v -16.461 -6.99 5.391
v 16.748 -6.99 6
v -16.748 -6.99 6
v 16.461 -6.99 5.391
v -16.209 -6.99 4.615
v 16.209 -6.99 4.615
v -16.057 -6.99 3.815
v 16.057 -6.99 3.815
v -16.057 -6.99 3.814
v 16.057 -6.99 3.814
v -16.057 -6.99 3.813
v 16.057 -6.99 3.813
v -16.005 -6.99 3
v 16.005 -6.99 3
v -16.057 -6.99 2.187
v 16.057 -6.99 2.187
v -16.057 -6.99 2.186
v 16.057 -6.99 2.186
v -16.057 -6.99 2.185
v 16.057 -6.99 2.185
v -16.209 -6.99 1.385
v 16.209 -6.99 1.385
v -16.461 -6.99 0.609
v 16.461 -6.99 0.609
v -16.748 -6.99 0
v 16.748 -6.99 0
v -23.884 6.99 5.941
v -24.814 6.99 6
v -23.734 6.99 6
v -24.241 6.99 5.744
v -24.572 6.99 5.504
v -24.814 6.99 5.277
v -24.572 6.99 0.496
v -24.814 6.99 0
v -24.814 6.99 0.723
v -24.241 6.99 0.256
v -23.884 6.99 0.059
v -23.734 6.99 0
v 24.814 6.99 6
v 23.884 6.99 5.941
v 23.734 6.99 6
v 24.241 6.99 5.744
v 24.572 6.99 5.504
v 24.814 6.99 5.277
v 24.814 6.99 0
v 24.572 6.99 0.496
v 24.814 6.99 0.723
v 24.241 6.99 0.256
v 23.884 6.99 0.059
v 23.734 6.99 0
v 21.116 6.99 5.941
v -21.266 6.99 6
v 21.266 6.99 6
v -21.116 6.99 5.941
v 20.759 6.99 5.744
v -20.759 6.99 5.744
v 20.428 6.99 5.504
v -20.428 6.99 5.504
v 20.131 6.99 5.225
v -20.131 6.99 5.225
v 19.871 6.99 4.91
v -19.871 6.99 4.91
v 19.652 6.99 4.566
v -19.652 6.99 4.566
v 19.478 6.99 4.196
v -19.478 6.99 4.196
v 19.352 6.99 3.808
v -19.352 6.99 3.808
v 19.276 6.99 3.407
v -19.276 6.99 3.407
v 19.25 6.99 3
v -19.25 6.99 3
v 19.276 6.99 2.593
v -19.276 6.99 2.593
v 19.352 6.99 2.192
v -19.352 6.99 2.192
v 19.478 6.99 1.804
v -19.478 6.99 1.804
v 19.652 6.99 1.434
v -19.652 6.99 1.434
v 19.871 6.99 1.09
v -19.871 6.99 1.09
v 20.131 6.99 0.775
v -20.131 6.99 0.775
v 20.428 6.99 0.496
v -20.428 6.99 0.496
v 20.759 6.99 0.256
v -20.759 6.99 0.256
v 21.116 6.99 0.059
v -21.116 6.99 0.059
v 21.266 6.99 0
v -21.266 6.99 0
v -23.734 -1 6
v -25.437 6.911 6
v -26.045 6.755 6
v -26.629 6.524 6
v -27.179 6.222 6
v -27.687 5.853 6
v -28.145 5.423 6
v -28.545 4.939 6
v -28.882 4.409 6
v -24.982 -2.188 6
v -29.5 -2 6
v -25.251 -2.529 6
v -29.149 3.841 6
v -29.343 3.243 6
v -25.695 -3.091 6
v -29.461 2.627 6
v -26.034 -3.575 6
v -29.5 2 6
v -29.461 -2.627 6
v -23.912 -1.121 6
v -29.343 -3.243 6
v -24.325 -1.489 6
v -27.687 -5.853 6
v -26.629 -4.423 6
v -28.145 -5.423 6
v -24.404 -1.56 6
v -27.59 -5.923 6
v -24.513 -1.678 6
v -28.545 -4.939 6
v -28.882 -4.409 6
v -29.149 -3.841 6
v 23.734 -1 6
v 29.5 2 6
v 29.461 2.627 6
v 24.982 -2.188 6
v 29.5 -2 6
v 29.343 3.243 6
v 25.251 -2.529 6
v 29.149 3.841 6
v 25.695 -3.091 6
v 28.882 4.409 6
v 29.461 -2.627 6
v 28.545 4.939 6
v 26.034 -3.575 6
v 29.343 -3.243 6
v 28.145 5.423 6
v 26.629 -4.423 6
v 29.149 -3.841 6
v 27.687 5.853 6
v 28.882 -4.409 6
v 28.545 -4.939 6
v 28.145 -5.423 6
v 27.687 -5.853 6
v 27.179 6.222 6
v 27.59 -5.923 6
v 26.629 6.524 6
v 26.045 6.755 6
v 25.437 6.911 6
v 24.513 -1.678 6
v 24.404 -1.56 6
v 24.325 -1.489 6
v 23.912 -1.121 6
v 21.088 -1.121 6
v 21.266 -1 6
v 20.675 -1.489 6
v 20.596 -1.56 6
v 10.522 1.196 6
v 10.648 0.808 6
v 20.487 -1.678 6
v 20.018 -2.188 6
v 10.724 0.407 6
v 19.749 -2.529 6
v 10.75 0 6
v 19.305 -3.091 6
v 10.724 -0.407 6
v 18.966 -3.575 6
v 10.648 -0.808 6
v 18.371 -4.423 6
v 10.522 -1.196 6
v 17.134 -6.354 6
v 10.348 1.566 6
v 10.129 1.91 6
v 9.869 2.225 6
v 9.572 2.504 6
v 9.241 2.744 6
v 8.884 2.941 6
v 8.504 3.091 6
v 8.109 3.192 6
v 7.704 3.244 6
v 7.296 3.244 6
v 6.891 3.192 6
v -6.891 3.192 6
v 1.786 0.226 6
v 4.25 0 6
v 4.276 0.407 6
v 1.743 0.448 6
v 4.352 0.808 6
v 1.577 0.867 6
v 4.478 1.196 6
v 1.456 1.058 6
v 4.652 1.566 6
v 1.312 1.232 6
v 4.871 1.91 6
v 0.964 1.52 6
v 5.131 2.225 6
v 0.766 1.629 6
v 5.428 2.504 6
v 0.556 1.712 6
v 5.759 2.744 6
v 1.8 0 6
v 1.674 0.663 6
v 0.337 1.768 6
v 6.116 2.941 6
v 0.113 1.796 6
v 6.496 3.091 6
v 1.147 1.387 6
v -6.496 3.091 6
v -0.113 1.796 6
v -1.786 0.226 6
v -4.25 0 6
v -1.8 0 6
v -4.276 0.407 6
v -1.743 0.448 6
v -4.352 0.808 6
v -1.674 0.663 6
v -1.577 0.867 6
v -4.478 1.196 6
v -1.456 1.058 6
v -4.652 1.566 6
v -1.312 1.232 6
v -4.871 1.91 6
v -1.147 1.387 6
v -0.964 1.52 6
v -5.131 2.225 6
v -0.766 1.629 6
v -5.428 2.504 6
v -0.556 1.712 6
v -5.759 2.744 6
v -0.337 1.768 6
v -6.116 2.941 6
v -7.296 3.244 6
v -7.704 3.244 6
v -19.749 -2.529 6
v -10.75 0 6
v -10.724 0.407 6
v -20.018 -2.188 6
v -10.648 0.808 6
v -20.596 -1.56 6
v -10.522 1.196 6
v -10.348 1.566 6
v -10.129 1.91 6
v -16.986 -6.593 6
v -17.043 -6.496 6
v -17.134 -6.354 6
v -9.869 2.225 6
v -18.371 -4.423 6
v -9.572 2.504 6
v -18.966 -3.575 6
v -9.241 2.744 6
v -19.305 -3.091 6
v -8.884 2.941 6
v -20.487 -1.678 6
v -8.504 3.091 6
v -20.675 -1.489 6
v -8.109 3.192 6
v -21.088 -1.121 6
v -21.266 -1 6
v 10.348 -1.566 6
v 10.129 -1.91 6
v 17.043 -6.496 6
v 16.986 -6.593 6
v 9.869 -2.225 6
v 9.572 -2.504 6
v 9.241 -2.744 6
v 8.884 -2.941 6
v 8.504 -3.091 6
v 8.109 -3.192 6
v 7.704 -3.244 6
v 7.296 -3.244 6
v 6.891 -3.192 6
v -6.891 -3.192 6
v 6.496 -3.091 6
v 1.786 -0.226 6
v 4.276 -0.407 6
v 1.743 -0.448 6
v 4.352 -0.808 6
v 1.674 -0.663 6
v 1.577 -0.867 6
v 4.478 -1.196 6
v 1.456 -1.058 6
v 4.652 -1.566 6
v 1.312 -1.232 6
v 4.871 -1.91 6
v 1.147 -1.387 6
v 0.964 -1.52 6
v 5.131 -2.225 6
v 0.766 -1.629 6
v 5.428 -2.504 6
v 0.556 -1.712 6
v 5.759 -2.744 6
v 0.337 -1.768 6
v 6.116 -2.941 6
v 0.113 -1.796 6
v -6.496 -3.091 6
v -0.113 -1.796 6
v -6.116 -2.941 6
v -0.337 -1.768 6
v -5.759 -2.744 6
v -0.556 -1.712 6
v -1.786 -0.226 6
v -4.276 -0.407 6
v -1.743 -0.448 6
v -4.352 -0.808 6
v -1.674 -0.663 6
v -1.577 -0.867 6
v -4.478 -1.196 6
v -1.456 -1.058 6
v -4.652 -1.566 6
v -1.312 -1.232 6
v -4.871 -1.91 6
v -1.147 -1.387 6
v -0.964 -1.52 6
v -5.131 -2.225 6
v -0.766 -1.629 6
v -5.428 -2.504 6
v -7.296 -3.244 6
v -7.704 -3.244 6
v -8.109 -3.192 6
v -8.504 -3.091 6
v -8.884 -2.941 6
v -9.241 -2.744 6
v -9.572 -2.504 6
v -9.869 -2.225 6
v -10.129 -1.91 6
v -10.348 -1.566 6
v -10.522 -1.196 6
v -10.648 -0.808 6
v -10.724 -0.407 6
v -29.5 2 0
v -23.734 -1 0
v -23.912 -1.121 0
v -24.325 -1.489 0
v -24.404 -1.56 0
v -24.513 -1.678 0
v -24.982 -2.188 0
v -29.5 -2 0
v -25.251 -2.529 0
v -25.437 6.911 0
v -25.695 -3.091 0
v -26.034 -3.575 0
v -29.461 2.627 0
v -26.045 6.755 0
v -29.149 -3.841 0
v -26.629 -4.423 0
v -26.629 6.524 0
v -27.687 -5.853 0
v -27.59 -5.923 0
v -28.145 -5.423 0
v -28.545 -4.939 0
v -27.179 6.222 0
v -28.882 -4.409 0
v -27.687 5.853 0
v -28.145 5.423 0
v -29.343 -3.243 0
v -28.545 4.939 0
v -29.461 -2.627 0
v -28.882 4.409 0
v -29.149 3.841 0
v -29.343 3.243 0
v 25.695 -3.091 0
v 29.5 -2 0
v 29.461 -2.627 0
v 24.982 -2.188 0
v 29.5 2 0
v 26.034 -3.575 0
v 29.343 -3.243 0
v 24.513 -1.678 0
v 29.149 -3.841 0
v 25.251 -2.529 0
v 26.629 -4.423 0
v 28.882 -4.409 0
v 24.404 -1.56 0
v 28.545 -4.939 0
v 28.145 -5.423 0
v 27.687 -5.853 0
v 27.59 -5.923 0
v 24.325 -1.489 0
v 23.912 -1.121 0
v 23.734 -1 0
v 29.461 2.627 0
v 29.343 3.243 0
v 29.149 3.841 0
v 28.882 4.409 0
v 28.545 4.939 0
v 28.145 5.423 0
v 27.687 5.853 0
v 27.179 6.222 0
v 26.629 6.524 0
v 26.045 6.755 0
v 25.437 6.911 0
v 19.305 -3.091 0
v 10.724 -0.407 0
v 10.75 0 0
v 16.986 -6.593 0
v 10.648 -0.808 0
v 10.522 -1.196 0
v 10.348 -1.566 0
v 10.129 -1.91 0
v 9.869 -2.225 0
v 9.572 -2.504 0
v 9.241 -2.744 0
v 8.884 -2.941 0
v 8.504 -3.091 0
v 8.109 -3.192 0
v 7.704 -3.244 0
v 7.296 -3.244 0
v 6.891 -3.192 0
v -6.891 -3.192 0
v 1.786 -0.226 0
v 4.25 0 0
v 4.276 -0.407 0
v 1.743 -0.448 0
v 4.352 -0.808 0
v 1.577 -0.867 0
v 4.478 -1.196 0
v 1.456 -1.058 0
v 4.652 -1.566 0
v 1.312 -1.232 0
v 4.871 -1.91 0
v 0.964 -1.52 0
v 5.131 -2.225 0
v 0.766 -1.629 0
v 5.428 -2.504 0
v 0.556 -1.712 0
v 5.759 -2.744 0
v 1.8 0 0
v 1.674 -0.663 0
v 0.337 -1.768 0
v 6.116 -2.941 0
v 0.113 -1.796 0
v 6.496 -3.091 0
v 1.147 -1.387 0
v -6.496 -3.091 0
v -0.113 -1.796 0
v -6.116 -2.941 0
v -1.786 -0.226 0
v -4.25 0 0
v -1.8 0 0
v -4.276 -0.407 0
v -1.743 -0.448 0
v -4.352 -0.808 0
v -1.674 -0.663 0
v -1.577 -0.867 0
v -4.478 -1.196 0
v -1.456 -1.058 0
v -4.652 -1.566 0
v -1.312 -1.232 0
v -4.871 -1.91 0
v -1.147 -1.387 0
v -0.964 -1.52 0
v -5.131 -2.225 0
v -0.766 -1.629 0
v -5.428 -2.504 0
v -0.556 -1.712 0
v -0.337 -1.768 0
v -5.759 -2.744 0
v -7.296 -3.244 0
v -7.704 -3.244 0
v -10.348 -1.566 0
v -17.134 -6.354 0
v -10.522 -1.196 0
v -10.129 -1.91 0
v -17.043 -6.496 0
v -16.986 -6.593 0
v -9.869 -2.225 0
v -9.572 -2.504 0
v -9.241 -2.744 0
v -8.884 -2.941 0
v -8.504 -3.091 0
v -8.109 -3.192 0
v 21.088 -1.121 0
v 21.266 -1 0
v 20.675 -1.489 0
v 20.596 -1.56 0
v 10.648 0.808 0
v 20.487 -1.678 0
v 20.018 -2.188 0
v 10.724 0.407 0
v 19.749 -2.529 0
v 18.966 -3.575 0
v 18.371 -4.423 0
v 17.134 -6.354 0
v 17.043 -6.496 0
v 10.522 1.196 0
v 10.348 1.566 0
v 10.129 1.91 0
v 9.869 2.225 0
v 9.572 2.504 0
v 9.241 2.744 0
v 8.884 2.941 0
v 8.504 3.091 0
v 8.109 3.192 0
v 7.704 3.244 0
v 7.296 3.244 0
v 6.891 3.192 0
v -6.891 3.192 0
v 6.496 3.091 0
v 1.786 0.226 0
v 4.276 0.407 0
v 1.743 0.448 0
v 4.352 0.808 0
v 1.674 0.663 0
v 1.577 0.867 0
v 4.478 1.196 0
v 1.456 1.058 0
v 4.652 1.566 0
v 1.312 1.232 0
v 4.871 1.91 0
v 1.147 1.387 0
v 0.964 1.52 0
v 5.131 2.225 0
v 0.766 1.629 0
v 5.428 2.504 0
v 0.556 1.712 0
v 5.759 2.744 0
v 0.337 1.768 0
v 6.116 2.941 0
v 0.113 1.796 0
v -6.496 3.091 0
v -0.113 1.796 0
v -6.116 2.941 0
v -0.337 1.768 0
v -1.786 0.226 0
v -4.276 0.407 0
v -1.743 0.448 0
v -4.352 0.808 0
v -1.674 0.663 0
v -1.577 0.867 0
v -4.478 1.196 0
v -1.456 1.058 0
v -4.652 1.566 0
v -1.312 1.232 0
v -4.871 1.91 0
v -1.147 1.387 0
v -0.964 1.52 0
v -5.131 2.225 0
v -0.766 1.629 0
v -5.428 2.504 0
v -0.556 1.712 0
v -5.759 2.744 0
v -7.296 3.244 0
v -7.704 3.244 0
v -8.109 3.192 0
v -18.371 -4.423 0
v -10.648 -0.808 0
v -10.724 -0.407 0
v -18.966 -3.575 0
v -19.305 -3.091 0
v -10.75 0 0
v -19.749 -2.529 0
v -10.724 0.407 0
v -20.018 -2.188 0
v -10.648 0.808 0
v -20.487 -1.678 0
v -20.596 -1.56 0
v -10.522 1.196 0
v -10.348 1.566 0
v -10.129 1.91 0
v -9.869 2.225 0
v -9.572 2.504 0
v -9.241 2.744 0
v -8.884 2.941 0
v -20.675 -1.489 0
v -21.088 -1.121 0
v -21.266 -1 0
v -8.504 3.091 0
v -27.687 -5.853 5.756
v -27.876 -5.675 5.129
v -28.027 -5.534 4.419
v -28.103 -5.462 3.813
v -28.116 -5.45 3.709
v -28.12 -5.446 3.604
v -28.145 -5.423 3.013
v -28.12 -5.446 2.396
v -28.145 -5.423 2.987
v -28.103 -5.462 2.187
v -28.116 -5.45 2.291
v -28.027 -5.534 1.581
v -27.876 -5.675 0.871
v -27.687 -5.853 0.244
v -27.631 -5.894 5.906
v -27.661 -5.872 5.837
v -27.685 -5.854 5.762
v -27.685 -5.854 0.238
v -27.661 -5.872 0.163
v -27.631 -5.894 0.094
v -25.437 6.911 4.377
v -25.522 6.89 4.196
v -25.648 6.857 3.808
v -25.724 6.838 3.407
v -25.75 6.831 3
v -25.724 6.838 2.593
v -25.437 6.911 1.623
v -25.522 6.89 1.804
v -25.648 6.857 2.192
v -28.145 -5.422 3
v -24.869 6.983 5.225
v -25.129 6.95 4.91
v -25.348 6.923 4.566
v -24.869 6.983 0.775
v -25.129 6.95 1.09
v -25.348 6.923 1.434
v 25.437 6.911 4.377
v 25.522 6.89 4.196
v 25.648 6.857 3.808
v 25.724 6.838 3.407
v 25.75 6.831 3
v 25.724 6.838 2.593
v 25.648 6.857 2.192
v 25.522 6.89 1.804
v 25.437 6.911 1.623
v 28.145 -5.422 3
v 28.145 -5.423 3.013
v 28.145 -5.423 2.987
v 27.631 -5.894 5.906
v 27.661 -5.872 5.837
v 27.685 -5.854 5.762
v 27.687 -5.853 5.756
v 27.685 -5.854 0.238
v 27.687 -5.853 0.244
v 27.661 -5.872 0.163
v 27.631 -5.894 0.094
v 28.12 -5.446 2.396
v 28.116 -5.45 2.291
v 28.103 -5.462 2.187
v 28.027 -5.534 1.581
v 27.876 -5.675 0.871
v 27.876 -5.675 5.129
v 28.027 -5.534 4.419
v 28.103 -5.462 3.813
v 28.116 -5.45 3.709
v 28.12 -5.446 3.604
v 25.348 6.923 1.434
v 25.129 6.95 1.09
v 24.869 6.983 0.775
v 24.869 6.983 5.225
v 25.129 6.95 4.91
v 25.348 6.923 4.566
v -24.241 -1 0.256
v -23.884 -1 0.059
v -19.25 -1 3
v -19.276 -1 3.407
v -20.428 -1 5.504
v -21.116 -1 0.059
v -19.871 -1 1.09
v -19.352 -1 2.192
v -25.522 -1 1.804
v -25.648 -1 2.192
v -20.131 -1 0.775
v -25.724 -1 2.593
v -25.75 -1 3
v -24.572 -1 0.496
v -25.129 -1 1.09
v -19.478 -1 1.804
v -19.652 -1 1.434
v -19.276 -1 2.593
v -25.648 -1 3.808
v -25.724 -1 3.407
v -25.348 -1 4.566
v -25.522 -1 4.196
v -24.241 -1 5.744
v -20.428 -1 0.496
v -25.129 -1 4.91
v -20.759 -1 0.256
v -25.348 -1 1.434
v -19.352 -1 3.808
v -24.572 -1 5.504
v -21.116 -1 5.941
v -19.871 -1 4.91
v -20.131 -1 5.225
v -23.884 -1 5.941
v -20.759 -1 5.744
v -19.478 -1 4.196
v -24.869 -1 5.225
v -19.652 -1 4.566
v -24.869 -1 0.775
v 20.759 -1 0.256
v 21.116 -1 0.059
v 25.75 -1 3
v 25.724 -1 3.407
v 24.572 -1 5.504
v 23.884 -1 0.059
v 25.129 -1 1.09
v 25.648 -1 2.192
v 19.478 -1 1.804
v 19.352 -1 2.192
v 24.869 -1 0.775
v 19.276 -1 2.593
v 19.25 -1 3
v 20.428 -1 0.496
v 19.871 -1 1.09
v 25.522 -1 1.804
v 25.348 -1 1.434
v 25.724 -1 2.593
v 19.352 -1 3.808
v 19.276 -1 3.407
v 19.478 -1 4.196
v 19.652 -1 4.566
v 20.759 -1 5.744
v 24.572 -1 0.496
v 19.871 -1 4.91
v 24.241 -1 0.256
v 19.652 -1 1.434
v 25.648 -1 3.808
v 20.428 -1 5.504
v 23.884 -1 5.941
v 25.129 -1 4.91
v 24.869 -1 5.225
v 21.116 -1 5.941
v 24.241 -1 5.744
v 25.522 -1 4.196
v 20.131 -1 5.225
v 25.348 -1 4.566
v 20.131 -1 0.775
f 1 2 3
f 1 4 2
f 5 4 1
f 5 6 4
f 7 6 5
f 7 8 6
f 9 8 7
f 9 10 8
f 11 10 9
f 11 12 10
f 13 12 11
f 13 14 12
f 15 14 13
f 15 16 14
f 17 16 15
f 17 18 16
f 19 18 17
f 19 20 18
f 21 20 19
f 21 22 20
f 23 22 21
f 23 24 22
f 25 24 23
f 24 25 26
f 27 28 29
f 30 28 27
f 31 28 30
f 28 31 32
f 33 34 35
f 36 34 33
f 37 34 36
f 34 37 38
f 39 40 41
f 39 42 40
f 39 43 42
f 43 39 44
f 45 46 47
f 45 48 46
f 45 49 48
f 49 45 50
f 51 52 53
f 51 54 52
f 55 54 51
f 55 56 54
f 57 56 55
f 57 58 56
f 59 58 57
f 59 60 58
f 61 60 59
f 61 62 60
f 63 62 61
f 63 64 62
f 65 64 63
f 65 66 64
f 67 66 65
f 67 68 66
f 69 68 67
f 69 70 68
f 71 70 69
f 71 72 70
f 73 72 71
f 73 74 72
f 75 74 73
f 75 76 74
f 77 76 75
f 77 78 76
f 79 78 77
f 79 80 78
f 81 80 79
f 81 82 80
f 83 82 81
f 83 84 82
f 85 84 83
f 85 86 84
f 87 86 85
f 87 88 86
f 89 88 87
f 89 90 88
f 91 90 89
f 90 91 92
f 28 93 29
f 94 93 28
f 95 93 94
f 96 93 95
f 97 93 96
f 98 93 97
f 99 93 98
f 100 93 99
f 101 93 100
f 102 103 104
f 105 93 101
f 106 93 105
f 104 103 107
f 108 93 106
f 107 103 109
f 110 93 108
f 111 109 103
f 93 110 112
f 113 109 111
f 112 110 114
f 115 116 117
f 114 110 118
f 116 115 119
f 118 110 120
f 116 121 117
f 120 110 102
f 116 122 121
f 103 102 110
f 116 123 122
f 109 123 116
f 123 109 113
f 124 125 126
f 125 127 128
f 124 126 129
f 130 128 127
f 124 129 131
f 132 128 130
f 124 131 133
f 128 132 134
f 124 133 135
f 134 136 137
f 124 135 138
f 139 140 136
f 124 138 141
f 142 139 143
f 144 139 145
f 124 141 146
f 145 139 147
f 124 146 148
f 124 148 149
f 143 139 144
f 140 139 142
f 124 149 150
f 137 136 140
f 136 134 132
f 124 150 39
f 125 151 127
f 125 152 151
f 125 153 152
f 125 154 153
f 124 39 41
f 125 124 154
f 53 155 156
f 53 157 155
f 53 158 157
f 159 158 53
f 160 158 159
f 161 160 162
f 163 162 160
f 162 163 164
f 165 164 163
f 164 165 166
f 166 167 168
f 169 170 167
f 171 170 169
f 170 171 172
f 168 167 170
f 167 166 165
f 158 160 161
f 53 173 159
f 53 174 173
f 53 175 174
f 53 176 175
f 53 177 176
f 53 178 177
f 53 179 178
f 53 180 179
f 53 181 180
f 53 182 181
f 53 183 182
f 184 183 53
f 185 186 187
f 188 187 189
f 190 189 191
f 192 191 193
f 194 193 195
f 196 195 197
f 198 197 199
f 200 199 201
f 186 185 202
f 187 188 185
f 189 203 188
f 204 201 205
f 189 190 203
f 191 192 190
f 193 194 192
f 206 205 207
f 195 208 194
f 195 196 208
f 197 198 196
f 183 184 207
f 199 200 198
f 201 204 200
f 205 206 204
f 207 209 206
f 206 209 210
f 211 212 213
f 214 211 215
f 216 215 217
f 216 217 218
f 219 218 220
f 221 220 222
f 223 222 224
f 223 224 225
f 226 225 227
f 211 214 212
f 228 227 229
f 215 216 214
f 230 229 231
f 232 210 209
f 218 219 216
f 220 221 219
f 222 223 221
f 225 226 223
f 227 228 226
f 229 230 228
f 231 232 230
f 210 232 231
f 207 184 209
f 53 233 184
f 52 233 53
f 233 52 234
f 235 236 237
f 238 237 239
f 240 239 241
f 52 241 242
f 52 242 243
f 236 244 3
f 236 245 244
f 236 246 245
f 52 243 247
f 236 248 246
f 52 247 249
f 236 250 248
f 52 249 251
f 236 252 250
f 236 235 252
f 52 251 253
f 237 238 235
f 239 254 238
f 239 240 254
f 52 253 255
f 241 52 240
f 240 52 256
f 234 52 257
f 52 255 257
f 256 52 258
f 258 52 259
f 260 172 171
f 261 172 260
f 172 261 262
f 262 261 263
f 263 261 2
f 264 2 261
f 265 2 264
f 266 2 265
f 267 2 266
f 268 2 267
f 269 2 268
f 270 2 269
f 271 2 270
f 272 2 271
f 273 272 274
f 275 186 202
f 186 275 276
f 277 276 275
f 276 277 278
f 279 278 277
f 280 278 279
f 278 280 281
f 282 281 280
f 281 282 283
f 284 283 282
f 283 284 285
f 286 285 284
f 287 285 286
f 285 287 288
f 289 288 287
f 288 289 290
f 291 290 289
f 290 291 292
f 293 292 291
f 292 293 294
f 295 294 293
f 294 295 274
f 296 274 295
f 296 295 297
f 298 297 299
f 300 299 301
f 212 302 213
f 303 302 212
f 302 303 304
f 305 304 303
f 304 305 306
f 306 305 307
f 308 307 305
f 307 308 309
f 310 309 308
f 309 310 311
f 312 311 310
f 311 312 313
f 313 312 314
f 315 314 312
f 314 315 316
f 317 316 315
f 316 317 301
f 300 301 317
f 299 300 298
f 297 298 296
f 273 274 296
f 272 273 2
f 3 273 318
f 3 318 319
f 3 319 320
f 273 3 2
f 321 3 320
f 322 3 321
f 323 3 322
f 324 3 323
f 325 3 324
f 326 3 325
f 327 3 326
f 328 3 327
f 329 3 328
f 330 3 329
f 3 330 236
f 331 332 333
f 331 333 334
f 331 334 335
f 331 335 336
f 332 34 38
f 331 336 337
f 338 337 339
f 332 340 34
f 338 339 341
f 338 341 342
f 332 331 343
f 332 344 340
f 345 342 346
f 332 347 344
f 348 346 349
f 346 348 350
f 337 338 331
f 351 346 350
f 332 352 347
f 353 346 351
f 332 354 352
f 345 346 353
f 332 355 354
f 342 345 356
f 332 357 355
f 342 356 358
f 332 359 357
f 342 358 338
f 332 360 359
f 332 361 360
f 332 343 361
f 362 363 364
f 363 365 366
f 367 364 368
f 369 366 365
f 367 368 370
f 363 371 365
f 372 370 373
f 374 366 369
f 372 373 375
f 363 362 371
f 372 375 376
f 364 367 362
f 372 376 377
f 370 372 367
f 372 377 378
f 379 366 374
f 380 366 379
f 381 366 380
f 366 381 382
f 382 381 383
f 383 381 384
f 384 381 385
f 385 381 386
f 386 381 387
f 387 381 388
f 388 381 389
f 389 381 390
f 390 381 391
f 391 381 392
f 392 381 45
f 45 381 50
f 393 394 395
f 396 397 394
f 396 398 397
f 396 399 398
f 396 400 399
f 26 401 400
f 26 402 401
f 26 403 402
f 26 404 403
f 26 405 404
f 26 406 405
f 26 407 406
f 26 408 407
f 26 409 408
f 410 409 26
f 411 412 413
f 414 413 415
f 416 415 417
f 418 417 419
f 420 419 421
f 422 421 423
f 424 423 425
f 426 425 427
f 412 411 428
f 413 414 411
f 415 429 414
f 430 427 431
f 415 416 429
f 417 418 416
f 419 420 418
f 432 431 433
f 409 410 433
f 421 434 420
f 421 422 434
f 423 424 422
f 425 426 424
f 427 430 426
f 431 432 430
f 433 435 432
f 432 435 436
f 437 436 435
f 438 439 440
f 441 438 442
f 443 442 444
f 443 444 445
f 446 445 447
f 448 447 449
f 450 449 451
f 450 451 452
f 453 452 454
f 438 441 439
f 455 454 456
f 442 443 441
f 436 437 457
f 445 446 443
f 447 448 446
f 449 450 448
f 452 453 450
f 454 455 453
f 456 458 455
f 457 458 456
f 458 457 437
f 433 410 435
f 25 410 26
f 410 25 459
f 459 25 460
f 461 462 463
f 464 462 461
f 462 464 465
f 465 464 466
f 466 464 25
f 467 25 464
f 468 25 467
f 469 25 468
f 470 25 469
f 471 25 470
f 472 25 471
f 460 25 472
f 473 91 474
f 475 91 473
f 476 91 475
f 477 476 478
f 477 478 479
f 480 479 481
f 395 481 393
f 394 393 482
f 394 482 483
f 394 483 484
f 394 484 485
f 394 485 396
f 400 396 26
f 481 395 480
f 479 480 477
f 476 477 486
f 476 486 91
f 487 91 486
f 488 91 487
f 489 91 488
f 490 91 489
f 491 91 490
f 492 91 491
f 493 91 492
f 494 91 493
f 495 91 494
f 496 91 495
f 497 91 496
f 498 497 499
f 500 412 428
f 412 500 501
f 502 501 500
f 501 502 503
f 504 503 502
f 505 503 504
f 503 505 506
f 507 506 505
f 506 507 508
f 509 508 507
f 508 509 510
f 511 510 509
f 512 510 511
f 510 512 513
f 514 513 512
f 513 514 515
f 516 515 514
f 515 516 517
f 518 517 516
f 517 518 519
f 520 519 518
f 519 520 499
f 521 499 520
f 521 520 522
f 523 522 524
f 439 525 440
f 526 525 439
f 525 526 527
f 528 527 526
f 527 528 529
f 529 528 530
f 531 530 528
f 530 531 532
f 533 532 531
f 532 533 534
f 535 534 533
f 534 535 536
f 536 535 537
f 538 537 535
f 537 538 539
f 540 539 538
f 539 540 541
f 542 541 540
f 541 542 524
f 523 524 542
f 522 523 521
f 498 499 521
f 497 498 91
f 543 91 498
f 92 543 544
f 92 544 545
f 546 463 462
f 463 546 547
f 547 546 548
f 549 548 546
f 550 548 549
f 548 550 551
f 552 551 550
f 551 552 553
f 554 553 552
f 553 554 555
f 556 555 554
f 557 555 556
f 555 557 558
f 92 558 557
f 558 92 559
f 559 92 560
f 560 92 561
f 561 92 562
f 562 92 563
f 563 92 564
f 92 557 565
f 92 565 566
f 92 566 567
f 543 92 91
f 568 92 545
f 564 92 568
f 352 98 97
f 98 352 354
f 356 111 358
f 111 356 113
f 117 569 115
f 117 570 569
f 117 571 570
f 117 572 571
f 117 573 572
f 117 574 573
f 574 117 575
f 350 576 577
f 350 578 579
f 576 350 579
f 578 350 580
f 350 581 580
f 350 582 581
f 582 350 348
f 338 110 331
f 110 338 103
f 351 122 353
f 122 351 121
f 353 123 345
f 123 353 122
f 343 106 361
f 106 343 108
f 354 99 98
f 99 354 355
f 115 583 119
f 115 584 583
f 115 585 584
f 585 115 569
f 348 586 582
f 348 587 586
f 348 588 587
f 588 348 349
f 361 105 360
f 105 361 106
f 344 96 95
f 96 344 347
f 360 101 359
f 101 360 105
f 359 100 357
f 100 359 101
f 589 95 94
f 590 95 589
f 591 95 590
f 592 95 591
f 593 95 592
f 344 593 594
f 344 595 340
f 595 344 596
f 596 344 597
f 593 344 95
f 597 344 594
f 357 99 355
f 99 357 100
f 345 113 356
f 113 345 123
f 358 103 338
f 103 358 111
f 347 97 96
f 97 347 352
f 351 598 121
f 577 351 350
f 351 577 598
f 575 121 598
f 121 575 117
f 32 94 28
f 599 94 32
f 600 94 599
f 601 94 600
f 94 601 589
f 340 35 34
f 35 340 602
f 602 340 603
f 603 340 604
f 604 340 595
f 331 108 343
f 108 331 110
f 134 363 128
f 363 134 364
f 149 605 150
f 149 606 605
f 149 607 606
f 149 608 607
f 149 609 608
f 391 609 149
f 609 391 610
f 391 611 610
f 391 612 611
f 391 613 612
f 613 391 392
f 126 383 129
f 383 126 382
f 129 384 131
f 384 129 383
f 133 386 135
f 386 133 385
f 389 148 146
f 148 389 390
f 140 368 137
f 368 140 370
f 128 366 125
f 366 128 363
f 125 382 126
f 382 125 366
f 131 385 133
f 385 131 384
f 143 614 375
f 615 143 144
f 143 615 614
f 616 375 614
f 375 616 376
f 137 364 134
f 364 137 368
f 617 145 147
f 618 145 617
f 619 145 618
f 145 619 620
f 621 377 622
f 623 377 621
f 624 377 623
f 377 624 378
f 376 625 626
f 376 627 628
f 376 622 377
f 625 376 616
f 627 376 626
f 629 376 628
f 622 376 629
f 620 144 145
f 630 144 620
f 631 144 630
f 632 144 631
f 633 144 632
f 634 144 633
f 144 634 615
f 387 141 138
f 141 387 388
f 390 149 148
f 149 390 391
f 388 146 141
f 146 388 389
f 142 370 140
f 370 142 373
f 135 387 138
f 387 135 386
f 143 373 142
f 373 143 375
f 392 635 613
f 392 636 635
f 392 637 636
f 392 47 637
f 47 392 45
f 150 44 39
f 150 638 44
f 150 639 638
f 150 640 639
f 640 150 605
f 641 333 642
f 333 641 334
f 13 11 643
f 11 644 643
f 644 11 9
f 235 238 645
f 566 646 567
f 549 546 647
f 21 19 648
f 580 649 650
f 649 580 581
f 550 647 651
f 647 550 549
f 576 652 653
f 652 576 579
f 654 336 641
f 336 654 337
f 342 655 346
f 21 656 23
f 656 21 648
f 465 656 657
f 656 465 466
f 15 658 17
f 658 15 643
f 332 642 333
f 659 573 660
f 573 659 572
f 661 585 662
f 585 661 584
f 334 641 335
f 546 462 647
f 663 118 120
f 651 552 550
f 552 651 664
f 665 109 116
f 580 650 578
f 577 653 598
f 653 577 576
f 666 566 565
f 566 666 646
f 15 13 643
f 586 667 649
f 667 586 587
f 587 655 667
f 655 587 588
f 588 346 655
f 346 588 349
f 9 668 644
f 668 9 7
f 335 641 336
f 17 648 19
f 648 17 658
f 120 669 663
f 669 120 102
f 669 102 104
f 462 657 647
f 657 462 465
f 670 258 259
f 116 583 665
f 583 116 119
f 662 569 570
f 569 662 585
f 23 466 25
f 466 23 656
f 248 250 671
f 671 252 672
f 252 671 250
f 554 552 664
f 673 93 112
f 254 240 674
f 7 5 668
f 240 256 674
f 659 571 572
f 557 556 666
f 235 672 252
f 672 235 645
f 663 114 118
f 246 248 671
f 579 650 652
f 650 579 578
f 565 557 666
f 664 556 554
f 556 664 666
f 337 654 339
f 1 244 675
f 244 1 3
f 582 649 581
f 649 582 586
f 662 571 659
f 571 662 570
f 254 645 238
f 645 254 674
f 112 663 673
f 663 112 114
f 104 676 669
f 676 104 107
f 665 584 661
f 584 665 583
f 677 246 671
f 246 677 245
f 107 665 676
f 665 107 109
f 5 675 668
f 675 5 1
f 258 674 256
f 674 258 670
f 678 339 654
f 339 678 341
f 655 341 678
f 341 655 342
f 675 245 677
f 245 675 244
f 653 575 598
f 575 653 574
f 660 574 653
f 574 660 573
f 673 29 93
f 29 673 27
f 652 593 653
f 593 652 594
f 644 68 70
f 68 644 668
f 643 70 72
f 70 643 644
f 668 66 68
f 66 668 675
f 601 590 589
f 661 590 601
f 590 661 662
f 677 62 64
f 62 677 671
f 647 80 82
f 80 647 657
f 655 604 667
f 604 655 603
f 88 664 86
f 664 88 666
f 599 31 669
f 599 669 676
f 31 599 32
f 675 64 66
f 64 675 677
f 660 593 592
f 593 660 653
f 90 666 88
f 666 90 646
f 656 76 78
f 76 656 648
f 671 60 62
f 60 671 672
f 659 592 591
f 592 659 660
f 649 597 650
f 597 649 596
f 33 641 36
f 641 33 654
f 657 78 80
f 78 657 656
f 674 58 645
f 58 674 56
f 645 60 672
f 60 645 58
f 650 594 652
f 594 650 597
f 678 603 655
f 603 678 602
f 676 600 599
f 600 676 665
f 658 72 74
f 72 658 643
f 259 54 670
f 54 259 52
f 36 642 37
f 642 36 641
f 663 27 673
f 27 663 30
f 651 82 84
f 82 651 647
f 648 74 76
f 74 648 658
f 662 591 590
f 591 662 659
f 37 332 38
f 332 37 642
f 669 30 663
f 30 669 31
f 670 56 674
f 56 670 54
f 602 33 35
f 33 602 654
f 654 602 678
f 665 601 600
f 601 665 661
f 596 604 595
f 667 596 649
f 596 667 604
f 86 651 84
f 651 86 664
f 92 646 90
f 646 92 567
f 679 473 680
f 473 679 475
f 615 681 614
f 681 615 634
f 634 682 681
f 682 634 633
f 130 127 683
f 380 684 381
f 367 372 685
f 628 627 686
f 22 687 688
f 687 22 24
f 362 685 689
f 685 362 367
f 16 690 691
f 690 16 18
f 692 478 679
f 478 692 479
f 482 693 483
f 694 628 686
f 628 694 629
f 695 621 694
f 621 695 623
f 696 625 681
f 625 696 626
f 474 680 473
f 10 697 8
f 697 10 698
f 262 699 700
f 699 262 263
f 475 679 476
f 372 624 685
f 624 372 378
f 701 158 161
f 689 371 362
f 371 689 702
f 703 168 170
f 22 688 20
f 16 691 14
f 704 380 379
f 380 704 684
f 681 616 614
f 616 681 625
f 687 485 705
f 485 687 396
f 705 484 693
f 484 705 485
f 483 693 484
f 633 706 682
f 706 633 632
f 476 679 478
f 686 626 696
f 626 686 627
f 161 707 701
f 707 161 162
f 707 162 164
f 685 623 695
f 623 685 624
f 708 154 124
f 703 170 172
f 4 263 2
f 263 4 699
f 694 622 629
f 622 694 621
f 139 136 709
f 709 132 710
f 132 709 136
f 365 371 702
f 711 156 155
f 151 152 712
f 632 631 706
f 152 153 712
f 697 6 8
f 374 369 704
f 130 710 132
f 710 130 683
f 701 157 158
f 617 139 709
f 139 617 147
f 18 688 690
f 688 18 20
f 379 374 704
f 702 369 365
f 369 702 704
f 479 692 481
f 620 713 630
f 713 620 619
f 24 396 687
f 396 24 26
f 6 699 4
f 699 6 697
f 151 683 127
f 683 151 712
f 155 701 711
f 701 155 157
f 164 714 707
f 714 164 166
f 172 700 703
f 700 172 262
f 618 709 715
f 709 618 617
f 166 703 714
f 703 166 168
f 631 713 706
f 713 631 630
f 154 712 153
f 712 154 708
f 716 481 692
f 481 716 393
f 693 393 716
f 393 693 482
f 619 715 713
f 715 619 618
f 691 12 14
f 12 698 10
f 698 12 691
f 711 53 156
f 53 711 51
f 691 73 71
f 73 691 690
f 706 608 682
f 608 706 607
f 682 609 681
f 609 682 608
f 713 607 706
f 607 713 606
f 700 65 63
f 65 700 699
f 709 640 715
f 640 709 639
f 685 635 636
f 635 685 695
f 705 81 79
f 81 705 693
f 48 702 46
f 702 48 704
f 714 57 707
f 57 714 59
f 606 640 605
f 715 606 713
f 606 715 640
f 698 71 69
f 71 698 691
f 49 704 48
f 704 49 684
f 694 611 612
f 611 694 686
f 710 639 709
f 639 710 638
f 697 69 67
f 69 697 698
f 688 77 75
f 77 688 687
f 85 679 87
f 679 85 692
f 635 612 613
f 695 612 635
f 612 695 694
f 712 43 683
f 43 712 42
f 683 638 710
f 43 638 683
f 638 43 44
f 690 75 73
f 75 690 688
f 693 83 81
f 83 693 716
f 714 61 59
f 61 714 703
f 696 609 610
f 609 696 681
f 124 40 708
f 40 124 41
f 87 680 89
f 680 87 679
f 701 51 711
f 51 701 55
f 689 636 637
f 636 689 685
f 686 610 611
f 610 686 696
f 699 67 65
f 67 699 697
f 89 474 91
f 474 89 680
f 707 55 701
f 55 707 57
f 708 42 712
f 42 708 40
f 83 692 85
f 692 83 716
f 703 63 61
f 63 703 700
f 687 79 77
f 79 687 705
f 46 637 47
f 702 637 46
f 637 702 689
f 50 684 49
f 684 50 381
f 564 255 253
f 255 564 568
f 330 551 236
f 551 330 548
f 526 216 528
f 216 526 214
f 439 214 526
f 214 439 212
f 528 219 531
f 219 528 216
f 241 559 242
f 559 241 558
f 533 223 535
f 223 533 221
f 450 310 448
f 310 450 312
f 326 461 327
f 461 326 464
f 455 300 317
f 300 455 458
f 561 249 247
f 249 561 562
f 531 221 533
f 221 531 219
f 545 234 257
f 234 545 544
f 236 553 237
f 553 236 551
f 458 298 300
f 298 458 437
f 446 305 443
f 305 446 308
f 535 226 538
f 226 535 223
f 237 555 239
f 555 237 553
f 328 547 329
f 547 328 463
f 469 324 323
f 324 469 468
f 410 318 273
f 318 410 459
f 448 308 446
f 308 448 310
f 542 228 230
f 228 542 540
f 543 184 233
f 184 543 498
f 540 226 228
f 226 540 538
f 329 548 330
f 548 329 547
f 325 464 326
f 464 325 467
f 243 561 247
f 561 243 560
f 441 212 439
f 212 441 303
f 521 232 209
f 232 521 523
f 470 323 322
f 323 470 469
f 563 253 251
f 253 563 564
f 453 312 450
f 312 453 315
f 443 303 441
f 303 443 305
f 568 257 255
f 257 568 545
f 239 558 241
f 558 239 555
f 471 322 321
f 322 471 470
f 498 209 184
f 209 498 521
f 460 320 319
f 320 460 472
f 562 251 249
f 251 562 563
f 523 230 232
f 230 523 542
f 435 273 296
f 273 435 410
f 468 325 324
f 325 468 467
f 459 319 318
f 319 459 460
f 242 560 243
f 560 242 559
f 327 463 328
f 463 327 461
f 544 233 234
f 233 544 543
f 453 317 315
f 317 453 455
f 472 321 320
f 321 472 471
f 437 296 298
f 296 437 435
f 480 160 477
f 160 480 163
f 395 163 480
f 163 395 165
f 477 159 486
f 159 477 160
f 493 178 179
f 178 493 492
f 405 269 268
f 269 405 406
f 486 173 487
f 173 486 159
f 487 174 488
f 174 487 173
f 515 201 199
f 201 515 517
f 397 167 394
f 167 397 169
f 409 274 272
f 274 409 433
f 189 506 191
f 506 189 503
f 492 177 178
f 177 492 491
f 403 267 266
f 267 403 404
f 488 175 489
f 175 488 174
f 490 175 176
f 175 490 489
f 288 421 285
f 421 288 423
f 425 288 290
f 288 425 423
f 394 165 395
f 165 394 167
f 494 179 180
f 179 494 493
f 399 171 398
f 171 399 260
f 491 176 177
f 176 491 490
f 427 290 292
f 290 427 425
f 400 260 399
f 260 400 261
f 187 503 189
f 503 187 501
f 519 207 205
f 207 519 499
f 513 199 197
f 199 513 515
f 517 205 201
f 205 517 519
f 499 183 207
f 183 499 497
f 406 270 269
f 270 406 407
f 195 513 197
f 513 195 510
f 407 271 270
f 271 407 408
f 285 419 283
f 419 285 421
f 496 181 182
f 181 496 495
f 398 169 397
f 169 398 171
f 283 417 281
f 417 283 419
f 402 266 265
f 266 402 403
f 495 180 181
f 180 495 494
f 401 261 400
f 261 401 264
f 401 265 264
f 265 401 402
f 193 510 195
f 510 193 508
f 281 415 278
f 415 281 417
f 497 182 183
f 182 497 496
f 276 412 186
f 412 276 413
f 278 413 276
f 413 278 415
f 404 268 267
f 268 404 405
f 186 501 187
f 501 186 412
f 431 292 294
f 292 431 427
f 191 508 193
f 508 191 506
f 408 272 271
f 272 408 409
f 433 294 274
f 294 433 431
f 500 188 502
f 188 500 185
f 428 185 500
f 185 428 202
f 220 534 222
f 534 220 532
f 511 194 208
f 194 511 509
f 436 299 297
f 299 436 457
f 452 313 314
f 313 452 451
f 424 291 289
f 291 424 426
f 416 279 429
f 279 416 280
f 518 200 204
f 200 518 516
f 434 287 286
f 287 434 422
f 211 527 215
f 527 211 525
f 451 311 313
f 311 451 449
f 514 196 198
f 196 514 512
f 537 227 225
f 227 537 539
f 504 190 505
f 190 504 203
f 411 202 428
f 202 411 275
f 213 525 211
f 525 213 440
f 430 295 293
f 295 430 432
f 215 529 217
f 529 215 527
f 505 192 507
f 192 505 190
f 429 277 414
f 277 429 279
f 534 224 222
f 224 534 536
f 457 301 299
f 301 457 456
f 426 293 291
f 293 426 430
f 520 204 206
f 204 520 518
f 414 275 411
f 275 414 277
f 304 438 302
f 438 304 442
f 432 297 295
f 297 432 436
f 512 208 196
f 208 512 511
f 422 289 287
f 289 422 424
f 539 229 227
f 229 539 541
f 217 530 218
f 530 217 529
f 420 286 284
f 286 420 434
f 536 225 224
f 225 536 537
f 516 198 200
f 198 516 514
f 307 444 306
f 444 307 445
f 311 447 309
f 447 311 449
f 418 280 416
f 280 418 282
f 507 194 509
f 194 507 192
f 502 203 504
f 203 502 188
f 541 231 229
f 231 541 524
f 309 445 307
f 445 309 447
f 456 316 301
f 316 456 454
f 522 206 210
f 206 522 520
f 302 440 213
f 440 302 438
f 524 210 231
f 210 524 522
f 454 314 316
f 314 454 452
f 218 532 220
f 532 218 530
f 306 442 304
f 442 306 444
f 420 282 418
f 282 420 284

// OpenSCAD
$fn = 50;


difference() {
	union() {
		hull() {
			translate(v = [-9.5000000000, 2.0000000000, 0]) {
				cylinder(h = 6, r = 5);
			}
			translate(v = [9.5000000000, 2.0000000000, 0]) {
				cylinder(h = 6, r = 5);
			}
			translate(v = [-9.5000000000, -2.0000000000, 0]) {
				cylinder(h = 6, r = 5);
			}
			translate(v = [9.5000000000, -2.0000000000, 0]) {
				cylinder(h = 6, r = 5);
			}
		}
		translate(v = [-15.0000000000, 0.0000000000, 0]) {
			hull() {
				translate(v = [-9.5000000000, 2.0000000000, 0]) {
					cylinder(h = 6, r = 5);
				}
				translate(v = [9.5000000000, 2.0000000000, 0]) {
					cylinder(h = 6, r = 5);
				}
				translate(v = [-9.5000000000, -2.0000000000, 0]) {
					cylinder(h = 6, r = 5);
				}
				translate(v = [9.5000000000, -2.0000000000, 0]) {
					cylinder(h = 6, r = 5);
				}
			}
		}
		translate(v = [15.0000000000, 0.0000000000, 0]) {
			hull() {
				translate(v = [-9.5000000000, 2.0000000000, 0]) {
					cylinder(h = 6, r = 5);
				}
				translate(v = [9.5000000000, 2.0000000000, 0]) {
					cylinder(h = 6, r = 5);
				}
				translate(v = [-9.5000000000, -2.0000000000, 0]) {
					cylinder(h = 6, r = 5);
				}
				translate(v = [9.5000000000, -2.0000000000, 0]) {
					cylinder(h = 6, r = 5);
				}
			}
		}
	}
	union() {
		translate(v = [-22.5000000000, -7.0000000000, 3.0000000000]) {
			rotate(a = [90, 0, 0]) {
				difference() {
					union() {
						#translate(v = [0, 0, -14.0000000000]) {
							cylinder(h = 14, r = 2.2500000000);
						}
						#translate(v = [0, 0, -6]) {
							cylinder(h = 6, r1 = 3.2500000000, r2 = 6.5000000000);
						}
						#translate(v = [0, 0, -14.0000000000]) {
							cylinder(h = 14, r = 3.2500000000);
						}
						#translate(v = [0, 0, -14.0000000000]) {
							cylinder(h = 14, r = 2.2500000000);
						}
					}
					union();
				}
			}
		}
		translate(v = [22.5000000000, -7.0000000000, 3.0000000000]) {
			rotate(a = [90, 0, 0]) {
				difference() {
					union() {
						#translate(v = [0, 0, -14.0000000000]) {
							cylinder(h = 14, r = 2.2500000000);
						}
						#translate(v = [0, 0, -6]) {
							cylinder(h = 6, r1 = 3.2500000000, r2 = 6.5000000000);
						}
						#translate(v = [0, 0, -14.0000000000]) {
							cylinder(h = 14, r = 3.2500000000);
						}
						#translate(v = [0, 0, -14.0000000000]) {
							cylinder(h = 14, r = 2.2500000000);
						}
					}
					union();
				}
			}
		}
		translate(v = [-7.5000000000, 0.0000000000, 0]) {
			translate(v = [0, 0, -100]) {
				cylinder(h = 200, r = 3.2500000000);
			}
		}
		translate(v = [7.5000000000, 0.0000000000, 0]) {
			translate(v = [0, 0, -100]) {
				cylinder(h = 200, r = 3.2500000000);
			}
		}
		translate(v = [-7.5000000000, 0.0000000000, 0]) {
			translate(v = [0, 0, -100]) {
				cylinder(h = 200, r = 1.8000000000);
			}
		}
		translate(v = [0, 0, -100]) {
			cylinder(h = 200, r = 1.8000000000);
		}
		translate(v = [7.5000000000, 0.0000000000, 0]) {
			translate(v = [0, 0, -100]) {
				cylinder(h = 200, r = 1.8000000000);
			}
		}
	}
}
